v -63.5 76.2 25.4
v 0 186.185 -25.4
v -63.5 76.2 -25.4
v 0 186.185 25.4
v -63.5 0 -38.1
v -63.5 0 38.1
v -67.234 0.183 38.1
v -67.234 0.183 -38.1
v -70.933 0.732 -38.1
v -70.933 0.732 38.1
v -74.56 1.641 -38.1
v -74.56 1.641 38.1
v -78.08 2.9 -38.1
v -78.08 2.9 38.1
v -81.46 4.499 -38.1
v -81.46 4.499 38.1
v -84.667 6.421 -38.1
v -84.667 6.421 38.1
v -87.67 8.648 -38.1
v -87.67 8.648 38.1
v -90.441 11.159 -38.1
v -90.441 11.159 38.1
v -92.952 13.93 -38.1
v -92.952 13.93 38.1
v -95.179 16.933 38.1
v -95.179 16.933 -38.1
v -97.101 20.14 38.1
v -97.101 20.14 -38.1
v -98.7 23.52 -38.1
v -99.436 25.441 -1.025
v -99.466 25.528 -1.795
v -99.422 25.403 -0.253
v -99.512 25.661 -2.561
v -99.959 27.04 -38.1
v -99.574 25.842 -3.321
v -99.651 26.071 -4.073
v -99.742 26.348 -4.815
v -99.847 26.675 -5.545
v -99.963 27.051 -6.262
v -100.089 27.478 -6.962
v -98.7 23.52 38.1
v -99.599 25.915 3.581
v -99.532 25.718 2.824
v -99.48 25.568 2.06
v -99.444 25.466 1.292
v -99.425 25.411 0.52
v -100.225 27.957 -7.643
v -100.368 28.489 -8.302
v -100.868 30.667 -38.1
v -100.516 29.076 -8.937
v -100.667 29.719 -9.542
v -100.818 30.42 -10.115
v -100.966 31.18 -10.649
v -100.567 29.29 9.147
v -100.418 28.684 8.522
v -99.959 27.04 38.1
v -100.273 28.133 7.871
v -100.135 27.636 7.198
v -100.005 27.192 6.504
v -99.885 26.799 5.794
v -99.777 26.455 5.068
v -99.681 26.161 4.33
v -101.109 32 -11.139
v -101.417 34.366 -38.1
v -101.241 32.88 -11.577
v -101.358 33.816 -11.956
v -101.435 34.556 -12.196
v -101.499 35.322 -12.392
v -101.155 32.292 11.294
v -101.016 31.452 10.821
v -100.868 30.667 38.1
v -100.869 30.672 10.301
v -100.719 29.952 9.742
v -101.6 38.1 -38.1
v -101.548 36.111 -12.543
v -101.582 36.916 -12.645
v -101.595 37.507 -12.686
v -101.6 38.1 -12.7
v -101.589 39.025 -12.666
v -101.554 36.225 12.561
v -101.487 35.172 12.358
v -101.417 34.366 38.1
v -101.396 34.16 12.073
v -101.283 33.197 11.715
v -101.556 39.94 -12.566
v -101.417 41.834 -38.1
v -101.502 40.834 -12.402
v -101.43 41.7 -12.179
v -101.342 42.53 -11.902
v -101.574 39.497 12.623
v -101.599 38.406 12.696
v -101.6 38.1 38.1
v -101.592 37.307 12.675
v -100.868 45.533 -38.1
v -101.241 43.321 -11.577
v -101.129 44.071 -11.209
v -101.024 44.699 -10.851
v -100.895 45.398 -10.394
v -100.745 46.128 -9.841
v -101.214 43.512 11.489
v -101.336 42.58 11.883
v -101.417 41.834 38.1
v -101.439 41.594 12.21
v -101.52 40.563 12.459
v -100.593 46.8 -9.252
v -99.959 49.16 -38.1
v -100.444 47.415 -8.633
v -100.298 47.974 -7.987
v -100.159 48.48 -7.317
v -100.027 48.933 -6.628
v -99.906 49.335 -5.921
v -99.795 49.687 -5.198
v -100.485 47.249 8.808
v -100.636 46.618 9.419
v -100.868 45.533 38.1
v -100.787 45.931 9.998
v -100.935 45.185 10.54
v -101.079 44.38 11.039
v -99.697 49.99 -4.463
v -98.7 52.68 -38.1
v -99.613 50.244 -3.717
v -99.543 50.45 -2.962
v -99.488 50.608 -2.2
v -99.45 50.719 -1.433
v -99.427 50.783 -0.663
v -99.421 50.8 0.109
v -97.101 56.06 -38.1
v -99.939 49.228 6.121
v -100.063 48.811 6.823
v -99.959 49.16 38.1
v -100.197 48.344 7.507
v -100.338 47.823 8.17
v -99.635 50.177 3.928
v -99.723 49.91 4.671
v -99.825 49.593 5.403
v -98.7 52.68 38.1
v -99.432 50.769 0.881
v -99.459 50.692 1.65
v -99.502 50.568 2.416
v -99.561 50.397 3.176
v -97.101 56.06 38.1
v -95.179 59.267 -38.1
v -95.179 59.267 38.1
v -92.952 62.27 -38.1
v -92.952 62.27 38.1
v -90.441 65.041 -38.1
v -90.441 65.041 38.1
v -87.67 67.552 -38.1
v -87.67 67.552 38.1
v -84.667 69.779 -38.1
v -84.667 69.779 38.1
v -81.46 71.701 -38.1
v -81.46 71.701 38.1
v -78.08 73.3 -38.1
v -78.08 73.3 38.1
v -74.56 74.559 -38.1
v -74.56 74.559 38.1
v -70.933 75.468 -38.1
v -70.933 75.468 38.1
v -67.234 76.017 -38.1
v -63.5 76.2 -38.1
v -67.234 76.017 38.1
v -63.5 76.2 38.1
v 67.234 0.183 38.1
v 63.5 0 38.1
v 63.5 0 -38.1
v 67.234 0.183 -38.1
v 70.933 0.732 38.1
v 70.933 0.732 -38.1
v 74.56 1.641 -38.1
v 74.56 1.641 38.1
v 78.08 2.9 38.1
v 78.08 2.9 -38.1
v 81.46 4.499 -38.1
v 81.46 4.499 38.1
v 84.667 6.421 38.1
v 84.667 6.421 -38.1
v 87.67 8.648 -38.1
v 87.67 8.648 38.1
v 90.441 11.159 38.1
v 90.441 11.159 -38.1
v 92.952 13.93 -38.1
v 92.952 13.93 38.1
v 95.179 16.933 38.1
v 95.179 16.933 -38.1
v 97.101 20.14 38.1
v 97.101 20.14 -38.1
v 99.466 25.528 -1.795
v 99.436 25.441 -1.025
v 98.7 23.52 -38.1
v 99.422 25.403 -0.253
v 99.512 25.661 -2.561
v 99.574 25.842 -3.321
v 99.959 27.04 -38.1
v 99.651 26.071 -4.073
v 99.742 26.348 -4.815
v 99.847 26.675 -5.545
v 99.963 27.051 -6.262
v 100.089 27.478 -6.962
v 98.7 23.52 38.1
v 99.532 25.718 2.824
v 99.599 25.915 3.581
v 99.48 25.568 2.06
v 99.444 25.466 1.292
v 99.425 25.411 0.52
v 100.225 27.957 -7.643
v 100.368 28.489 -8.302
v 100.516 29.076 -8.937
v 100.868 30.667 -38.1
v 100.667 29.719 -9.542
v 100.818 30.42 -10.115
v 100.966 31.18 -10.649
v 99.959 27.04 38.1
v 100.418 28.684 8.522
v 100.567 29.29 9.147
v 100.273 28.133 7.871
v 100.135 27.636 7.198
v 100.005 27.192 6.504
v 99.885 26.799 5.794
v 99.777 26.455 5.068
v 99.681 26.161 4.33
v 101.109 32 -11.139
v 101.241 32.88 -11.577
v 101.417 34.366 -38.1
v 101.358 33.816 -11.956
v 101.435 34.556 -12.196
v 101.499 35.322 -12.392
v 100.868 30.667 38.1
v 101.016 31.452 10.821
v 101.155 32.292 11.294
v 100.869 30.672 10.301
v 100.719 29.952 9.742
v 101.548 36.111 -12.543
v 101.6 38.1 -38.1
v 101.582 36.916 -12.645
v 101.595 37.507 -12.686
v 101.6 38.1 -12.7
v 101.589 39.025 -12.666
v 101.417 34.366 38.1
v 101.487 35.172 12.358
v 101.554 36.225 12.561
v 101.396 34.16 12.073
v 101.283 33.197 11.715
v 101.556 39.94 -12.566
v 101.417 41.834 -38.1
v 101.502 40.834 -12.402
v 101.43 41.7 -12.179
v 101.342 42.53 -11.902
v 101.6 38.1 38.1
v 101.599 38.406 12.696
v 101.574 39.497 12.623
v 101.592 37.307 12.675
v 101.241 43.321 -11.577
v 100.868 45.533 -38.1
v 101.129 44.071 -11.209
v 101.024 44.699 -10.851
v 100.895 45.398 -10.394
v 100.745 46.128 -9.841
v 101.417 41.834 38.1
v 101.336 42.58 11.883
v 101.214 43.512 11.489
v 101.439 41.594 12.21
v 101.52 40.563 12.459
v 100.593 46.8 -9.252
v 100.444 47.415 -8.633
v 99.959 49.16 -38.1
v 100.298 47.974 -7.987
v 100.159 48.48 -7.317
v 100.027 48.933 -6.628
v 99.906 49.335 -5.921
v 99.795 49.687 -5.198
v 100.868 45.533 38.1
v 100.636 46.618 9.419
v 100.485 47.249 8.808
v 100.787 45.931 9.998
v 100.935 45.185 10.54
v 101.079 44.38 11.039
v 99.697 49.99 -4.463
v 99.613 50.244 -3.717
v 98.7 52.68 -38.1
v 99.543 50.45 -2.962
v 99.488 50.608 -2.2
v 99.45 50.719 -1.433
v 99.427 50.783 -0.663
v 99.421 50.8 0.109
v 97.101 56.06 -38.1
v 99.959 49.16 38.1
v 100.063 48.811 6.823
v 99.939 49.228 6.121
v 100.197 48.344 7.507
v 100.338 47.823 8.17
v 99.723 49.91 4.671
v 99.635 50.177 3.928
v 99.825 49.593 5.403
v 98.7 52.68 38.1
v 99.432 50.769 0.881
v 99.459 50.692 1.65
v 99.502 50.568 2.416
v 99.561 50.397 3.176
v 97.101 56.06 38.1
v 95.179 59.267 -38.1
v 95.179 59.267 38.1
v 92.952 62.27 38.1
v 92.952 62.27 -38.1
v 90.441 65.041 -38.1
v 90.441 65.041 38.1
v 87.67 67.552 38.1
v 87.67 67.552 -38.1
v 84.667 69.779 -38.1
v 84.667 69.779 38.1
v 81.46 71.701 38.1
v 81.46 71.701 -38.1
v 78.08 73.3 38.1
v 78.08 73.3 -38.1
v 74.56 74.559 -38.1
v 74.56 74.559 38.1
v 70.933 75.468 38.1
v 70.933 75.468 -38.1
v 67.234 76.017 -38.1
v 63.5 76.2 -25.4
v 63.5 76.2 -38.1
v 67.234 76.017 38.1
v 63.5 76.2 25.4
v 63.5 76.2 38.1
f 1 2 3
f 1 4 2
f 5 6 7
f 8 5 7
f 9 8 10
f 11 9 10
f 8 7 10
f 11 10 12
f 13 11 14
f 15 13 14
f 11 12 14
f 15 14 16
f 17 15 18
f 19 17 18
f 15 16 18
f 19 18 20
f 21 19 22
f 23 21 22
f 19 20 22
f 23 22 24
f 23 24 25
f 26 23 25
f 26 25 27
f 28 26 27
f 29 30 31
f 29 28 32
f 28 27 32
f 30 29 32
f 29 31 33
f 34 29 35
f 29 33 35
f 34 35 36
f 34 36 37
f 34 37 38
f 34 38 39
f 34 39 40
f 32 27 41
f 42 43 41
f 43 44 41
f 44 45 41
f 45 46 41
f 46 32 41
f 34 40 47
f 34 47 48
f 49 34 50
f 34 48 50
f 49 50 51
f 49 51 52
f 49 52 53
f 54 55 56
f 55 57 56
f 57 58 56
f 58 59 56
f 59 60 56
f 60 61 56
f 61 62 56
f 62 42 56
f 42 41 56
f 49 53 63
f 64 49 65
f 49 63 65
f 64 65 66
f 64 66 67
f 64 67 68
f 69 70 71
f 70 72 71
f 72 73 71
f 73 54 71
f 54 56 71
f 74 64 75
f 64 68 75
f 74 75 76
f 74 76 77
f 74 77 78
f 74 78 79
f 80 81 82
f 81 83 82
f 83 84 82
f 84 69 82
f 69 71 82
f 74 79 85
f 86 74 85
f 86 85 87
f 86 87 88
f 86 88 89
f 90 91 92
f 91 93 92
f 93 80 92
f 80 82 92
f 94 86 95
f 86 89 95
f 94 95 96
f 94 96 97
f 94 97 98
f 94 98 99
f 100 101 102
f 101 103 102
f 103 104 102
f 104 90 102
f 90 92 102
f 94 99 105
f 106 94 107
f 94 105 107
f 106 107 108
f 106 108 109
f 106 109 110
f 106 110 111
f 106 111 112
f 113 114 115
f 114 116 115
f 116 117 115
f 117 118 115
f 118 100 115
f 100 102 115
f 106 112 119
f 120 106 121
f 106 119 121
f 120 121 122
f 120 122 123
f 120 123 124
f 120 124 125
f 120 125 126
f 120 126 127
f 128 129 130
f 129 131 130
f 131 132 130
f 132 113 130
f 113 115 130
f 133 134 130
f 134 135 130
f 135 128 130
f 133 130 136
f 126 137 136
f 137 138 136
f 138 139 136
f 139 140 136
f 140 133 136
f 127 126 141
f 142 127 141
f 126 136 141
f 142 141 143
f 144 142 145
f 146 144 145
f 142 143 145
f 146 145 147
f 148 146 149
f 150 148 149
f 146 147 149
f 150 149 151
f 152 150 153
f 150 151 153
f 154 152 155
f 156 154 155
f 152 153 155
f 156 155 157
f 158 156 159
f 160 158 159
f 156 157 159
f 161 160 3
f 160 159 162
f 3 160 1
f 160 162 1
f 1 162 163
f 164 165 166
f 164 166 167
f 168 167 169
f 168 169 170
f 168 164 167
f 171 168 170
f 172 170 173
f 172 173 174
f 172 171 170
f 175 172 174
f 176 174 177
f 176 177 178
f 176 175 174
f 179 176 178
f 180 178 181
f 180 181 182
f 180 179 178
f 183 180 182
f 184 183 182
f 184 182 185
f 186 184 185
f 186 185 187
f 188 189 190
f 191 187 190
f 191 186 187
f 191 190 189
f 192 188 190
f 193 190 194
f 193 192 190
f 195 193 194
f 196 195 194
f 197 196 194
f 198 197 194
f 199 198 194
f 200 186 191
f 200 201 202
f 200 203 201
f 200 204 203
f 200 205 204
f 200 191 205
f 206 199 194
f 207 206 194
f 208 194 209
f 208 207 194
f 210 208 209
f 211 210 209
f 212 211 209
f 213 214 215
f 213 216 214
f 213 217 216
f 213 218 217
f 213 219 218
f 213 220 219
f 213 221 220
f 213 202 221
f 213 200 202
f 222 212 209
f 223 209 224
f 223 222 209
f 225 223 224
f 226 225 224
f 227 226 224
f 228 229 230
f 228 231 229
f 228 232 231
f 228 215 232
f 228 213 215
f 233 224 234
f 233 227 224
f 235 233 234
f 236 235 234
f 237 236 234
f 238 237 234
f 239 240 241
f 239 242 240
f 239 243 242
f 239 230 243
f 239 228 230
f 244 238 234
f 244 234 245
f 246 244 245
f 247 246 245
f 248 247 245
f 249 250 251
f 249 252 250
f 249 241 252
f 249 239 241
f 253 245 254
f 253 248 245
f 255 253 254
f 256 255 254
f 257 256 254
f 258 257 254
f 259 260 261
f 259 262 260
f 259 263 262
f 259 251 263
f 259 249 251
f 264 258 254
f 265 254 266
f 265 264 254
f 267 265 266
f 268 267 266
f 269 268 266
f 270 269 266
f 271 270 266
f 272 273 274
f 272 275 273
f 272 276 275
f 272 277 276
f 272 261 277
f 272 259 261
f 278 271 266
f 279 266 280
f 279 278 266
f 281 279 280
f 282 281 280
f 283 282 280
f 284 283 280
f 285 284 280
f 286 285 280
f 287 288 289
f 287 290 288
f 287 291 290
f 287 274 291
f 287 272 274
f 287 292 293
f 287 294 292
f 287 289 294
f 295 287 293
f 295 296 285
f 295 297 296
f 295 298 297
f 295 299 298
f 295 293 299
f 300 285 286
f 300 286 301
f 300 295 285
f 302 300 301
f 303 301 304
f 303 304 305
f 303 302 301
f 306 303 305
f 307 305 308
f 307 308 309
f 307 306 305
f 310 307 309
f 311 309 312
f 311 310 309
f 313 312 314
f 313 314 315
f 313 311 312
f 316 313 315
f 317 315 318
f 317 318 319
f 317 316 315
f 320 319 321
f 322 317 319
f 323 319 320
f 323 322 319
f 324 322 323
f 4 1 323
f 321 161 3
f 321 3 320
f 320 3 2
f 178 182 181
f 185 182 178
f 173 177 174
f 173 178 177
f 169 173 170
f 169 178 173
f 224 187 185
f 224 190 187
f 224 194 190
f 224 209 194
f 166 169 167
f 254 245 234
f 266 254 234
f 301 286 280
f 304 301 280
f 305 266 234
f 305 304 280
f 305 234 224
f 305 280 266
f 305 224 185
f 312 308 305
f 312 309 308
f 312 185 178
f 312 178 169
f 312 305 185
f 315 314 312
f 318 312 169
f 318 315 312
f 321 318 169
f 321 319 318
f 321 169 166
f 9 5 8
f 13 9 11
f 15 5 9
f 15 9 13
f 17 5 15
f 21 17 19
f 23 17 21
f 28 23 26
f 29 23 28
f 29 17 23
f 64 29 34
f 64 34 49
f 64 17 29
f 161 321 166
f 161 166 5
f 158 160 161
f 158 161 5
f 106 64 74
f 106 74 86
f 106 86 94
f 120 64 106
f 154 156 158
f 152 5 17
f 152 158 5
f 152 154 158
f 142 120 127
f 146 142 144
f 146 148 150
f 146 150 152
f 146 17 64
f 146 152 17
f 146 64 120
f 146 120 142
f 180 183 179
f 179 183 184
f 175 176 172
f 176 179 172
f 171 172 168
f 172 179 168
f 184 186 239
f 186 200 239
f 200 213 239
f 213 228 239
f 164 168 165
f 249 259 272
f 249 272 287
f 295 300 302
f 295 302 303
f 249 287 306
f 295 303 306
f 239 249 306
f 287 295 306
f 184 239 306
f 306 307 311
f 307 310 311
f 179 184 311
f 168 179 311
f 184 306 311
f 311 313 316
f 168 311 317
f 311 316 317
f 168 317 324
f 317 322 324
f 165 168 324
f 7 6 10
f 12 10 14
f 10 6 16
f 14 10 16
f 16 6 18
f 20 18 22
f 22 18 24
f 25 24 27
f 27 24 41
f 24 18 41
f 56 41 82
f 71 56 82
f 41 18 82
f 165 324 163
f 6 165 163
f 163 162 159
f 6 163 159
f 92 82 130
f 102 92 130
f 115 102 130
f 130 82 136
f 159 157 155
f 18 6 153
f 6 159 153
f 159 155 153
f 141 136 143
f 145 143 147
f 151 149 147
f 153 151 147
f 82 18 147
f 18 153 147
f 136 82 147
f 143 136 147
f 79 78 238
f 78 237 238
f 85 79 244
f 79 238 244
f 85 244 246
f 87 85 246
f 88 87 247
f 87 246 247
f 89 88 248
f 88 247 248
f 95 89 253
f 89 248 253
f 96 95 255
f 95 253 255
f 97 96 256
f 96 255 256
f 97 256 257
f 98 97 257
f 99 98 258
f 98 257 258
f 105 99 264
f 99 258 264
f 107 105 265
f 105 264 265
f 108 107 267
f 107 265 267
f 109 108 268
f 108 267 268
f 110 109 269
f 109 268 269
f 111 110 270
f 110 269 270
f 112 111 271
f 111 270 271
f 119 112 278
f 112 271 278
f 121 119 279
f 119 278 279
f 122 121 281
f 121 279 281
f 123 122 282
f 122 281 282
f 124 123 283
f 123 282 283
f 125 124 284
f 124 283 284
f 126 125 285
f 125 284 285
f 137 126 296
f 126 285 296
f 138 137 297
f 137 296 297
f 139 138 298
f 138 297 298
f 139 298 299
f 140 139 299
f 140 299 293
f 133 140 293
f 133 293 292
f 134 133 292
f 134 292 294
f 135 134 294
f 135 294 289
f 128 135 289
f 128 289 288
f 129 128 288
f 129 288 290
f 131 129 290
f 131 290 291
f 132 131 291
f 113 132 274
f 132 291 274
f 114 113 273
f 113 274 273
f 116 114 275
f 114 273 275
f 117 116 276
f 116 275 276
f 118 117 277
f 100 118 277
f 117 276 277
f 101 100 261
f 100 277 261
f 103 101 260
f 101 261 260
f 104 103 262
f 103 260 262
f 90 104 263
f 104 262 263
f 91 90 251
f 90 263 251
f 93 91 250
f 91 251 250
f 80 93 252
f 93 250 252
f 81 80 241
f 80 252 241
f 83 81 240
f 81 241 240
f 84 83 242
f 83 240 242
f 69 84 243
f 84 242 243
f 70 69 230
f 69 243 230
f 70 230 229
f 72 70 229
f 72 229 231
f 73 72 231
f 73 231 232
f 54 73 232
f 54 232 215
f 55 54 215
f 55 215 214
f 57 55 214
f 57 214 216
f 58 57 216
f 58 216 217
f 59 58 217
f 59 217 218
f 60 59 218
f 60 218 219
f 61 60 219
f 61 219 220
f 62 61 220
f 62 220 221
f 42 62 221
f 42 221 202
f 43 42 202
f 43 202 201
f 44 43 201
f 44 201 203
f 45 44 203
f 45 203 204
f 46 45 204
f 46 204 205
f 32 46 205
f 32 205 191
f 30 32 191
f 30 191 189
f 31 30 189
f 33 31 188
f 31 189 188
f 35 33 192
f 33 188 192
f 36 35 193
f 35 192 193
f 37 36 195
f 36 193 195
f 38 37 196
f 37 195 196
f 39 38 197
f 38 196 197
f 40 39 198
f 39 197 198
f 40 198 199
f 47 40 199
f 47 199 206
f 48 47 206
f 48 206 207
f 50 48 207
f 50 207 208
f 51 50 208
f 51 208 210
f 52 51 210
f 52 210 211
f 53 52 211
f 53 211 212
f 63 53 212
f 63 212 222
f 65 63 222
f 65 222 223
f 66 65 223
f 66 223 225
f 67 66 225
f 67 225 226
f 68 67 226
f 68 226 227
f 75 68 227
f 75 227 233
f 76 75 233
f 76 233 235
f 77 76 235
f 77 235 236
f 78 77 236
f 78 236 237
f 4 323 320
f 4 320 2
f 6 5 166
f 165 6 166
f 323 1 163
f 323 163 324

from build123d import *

# Parameters (mm, degrees)
SKETCH3_W               = 127
SKETCH3_H               = 76.2
BOSS_EXTRUDE1_DEPTH     = 76.2
BOSS_EXTRUDE2_DEPTH     = 76.2
BOSS_EXTRUDE3_DEPTH     = 25.4
SKETCH6_R               = 12.7
CUT_EXTRUDE1_DEPTH      = 102.6
CUT_EXTRUDE1_DEPTH_BACK = 102.6


with BuildPart() as part:
    # Sketch3 → Boss-Extrude1 (new body)
    with BuildSketch(Plane(origin=(0, 0, 0), x_dir=(1, 0, 0), z_dir=(0, 1, 0))):
        Rectangle(SKETCH3_W, SKETCH3_H)
    extrude(amount=BOSS_EXTRUDE1_DEPTH)

    # Sketch4 → Boss-Extrude2 (add)
    with BuildSketch(Plane.XY.offset(38.1)):
        with BuildLine():
            Line((-63.5, 76.2), (-63.5, 0))
            ThreePointArc((-63.5, 0), (-101.6, 38.1), (-63.5, 76.2))
        make_face()
        with BuildLine():
            Line((63.5, 76.2), (63.5, 0))
            ThreePointArc((63.5, 0), (101.6, 38.1), (63.5, 76.2))
        make_face()
    extrude(amount=-BOSS_EXTRUDE2_DEPTH)

    # Sketch5 → Boss-Extrude3 (add, symmetric)
    with BuildSketch(Plane.XY):
        Polygon((-63.5, 76.2), (63.5, 76.2), (0, 186.185226281), align=None)
    extrude(amount=BOSS_EXTRUDE3_DEPTH, both=True)

    # Sketch6 → Cut-Extrude1 (cut, two sides)
    with BuildSketch(Plane(origin=(0, 0, 0), x_dir=(0, 0, -1), z_dir=(1, 0, 0))) as cut_extrude1_sk:
        with Locations((0, 38.1)):
            Circle(SKETCH6_R)
    extrude(amount=CUT_EXTRUDE1_DEPTH, mode=Mode.SUBTRACT)
    extrude(cut_extrude1_sk.sketch, amount=-CUT_EXTRUDE1_DEPTH_BACK, mode=Mode.SUBTRACT)


solid = part.part
